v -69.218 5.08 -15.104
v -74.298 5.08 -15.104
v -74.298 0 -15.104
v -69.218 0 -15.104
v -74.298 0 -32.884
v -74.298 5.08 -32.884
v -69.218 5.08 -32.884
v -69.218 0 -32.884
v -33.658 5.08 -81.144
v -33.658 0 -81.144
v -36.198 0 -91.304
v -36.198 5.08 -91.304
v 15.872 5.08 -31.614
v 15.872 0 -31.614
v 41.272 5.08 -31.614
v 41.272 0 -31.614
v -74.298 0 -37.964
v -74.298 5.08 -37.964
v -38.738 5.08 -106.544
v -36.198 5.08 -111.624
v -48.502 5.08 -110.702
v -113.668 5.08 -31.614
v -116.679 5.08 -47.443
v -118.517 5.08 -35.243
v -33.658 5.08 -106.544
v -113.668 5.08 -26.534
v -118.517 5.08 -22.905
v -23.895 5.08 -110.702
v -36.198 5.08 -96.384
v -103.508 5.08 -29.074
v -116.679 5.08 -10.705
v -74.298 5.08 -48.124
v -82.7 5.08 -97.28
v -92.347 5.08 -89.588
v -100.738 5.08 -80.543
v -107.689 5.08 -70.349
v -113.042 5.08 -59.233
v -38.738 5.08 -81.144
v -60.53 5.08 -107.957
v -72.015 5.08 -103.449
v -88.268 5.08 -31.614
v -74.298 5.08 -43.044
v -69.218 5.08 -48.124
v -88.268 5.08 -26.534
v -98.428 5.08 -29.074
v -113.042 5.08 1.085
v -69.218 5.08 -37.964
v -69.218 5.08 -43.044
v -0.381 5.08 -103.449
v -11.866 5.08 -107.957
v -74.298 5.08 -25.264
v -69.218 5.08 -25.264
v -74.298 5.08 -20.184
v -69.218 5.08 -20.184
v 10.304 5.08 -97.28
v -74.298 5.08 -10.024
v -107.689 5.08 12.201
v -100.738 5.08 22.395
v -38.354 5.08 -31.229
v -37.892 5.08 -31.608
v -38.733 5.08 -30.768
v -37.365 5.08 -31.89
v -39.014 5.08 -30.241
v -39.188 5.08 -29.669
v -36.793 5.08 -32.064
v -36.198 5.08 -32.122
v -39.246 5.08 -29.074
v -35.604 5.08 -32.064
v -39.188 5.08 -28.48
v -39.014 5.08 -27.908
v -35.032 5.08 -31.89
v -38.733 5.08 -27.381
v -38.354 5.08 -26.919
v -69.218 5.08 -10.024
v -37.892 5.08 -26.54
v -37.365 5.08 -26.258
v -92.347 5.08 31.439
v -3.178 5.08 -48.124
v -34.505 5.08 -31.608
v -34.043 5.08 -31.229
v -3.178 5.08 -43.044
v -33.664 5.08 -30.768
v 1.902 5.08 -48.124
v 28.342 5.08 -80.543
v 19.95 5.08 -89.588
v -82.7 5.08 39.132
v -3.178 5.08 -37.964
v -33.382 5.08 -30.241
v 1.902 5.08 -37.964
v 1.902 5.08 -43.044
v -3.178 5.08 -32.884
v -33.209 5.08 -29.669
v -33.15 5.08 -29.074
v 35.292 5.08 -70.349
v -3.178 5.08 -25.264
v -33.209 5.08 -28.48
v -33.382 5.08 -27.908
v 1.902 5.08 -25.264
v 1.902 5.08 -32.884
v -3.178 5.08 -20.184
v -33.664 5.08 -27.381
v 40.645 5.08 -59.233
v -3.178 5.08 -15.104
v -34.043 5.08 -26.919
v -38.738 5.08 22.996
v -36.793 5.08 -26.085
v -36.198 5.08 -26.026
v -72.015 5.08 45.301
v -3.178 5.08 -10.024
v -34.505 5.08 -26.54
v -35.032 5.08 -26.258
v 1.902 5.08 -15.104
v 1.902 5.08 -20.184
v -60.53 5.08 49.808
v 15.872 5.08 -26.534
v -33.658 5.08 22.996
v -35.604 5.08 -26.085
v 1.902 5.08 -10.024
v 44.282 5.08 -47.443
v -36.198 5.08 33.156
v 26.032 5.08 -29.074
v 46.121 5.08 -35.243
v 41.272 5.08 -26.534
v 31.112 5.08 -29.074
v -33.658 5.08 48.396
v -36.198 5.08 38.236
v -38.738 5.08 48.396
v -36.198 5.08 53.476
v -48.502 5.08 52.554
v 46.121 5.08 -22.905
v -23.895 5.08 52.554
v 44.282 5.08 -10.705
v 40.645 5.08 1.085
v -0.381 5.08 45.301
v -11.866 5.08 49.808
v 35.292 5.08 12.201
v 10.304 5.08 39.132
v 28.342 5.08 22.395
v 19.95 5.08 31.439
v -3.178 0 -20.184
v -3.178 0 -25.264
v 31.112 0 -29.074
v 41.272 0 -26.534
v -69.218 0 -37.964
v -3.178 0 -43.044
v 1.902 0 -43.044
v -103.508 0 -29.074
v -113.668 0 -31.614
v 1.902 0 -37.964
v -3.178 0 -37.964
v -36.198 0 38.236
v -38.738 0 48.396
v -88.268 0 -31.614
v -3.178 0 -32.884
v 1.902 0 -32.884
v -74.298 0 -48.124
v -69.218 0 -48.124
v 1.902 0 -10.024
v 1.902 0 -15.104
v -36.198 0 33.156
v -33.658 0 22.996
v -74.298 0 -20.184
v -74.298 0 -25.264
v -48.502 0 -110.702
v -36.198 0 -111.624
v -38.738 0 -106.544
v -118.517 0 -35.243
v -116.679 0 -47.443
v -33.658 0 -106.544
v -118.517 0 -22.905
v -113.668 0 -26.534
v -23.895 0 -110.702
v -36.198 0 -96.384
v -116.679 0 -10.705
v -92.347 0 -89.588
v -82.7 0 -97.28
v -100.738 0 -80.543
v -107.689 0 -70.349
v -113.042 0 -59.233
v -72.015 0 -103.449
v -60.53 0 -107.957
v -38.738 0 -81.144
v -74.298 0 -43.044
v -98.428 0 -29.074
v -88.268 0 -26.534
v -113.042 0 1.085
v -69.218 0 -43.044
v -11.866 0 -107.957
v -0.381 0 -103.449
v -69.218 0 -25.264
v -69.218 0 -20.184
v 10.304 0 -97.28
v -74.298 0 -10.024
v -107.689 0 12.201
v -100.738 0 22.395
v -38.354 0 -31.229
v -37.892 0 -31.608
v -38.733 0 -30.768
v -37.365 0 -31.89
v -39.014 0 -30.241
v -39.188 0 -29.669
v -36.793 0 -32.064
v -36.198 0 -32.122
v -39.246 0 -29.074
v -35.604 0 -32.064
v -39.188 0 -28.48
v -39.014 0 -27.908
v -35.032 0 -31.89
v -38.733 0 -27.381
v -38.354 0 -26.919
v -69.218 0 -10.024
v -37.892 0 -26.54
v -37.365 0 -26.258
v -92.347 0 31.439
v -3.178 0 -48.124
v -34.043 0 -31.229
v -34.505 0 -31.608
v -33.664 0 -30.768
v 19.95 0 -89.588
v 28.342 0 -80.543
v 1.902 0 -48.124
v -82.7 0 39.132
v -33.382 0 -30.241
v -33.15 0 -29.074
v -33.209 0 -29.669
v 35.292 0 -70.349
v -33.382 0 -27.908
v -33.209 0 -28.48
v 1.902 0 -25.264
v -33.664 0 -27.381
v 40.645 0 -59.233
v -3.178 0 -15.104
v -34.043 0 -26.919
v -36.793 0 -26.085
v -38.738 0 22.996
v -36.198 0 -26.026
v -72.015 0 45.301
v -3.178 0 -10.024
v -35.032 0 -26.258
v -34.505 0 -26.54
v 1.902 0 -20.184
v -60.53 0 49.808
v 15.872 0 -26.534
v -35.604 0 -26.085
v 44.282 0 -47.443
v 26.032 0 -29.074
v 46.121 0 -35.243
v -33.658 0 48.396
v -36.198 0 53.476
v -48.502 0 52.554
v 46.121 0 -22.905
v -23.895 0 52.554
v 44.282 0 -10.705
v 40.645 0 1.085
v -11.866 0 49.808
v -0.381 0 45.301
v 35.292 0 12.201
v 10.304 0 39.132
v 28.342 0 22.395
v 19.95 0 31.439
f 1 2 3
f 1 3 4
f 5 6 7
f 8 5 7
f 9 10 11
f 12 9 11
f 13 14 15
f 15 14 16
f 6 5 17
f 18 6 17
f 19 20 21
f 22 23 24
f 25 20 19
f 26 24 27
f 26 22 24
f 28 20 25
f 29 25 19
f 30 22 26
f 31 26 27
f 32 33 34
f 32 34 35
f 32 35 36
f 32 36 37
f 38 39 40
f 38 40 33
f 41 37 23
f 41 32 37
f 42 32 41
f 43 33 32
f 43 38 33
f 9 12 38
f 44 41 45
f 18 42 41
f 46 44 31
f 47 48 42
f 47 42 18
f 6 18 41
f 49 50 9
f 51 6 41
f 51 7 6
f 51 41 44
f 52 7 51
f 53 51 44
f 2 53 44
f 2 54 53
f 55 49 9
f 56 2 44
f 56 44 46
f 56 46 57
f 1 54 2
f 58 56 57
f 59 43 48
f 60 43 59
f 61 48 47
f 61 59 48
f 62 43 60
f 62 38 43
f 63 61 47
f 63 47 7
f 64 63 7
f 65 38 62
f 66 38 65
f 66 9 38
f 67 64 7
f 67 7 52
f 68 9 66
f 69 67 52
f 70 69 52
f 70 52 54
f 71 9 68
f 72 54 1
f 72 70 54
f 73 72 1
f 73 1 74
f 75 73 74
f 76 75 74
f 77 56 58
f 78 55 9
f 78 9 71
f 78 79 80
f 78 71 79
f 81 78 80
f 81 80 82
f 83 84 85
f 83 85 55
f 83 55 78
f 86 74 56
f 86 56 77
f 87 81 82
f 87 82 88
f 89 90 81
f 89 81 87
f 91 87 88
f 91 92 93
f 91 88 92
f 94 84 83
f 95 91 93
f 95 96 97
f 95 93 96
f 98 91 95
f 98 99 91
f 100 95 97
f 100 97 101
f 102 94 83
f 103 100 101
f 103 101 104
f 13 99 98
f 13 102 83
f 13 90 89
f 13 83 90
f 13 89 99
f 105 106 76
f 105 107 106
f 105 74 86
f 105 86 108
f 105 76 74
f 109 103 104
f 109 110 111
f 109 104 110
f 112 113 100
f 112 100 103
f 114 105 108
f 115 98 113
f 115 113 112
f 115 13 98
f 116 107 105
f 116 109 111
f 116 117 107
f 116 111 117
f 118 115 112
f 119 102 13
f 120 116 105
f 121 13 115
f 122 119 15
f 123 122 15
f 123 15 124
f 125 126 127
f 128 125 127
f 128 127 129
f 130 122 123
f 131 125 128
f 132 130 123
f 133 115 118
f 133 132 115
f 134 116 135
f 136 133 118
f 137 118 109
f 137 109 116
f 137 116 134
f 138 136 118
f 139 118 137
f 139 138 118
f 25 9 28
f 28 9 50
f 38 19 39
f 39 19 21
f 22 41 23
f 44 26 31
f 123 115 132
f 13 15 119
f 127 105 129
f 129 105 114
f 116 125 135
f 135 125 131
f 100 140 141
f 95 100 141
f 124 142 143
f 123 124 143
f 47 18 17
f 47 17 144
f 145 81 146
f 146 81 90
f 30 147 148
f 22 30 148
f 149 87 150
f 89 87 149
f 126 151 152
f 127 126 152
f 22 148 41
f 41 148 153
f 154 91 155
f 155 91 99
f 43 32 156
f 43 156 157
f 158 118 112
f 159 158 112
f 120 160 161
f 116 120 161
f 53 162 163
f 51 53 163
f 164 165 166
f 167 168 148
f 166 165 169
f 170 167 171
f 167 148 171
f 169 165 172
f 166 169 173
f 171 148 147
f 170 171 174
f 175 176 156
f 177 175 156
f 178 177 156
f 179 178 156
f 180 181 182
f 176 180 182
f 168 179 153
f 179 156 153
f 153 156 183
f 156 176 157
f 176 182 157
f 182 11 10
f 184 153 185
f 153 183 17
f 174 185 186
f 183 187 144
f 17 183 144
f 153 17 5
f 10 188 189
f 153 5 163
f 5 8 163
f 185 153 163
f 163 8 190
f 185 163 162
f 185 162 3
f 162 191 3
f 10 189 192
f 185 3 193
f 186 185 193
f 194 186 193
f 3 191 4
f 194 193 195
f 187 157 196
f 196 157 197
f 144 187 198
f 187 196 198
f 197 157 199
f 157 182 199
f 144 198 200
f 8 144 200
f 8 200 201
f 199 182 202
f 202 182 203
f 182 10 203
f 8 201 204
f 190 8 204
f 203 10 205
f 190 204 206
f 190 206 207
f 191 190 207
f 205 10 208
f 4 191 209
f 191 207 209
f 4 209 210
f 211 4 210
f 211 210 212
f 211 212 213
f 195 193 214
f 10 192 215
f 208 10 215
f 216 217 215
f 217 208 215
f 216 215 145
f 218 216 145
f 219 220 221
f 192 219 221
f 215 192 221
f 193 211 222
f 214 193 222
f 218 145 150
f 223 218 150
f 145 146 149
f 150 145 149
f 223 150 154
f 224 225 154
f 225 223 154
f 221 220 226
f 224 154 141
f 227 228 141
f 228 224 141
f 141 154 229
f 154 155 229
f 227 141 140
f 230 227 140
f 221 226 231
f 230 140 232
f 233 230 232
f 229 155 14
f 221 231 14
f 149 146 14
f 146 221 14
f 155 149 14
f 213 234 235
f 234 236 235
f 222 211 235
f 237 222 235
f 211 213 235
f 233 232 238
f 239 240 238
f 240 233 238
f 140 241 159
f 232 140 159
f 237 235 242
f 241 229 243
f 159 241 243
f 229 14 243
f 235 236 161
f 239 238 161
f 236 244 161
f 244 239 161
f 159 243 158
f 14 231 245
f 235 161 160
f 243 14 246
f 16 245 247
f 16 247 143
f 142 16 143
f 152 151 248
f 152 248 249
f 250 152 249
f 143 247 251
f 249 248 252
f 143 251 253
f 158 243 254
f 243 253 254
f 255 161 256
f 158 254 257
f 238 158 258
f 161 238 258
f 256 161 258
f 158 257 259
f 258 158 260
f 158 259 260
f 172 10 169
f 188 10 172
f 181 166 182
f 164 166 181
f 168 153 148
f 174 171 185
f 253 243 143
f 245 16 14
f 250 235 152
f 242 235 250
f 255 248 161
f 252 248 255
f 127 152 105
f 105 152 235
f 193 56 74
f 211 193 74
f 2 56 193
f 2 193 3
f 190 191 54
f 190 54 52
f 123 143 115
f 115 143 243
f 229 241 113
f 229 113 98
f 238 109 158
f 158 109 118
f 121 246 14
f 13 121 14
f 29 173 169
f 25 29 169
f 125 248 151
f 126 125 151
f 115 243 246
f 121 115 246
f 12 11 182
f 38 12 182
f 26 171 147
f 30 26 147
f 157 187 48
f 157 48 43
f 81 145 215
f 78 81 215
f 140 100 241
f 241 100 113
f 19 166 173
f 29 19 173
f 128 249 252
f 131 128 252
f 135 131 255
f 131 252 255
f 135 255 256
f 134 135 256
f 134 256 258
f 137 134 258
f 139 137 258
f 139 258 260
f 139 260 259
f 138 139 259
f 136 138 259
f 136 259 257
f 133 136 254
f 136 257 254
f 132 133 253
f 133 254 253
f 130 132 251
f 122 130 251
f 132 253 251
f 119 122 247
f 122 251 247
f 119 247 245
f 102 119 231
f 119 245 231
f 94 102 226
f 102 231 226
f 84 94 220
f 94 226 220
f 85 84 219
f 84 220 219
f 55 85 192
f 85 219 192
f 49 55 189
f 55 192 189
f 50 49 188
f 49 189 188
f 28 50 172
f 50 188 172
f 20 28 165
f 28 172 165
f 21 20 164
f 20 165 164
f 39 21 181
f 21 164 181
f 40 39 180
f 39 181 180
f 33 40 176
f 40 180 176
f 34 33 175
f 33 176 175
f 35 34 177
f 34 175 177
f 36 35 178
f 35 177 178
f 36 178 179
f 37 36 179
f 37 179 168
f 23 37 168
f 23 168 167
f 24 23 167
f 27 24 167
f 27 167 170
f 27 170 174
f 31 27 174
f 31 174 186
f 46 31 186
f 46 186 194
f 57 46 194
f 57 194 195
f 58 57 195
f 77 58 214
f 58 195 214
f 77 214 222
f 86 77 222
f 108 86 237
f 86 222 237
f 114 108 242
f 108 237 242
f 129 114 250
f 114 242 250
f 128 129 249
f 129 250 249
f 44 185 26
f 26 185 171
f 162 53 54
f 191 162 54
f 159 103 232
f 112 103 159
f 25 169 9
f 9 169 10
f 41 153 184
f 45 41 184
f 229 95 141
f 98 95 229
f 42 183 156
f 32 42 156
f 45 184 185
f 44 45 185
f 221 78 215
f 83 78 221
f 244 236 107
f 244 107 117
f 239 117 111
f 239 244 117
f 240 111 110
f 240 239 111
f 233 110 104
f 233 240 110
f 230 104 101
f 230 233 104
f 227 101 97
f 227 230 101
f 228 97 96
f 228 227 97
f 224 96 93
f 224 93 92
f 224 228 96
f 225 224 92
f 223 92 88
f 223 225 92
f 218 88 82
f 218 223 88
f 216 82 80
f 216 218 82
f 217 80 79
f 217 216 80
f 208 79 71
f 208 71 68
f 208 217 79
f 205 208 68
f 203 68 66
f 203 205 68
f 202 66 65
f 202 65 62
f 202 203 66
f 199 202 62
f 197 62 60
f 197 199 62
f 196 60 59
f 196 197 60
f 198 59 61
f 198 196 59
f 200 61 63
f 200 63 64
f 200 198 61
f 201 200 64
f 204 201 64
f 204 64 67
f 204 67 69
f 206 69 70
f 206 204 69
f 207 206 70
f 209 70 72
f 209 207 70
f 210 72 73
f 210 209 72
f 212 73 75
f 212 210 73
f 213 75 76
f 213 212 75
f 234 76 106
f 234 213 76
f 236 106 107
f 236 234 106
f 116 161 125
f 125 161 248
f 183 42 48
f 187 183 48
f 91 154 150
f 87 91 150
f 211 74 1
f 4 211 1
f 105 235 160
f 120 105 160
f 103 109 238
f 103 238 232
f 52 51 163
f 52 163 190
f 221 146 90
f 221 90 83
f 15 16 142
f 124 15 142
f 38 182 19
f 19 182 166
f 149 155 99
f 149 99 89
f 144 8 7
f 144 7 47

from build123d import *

# Parameters (mm, degrees)
SKETCH1_R           = 82.55
SKETCH1_R_2         = 3.048
BOSS_EXTRUDE1_DEPTH = 5.08
SKETCH2_W           = 5.08
SKETCH2_H           = 5.08
CUT_EXTRUDE1_DEPTH  = 5.08


with BuildPart() as part:
    # Sketch1 → Boss-Extrude1 (new body)
    with BuildSketch(Plane(origin=(0, 0, 0), x_dir=(1, 0, 0), z_dir=(0, 1, 0))):
        with Locations(Location((-36.198285131, 29.074154547, 0), (0, 0, 270))):
            Circle(SKETCH1_R)
        with Locations(Location((-36.198285131, 29.074154547, 0), (0, 0, 270))):
            Circle(SKETCH1_R_2, mode=Mode.SUBTRACT)
        Polygon((-36.198285131, 96.384154547), (-33.658285131, 106.544154547), (-33.658285131, 81.144154547), (-36.198285131, 91.304154547), (-38.738285131, 81.144154547), (-38.738285131, 106.544154547), align=None, mode=Mode.SUBTRACT)
        Polygon((31.111714869, 29.074154547), (41.271714869, 26.534154547), (15.871714869, 26.534154547), (26.031714869, 29.074154547), (15.871714869, 31.614154547), (41.271714869, 31.614154547), align=None, mode=Mode.SUBTRACT)
        Polygon((-36.198285131, -38.235845453), (-38.738285131, -48.395845453), (-38.738285131, -22.995845453), (-36.198285131, -33.155845453), (-33.658285131, -22.995845453), (-33.658285131, -48.395845453), align=None, mode=Mode.SUBTRACT)
        Polygon((-103.508285131, 29.074154547), (-113.668285131, 31.614154547), (-88.268285131, 31.614154547), (-98.428285131, 29.074154547), (-88.268285131, 26.534154547), (-113.668285131, 26.534154547), align=None, mode=Mode.SUBTRACT)
    extrude(amount=BOSS_EXTRUDE1_DEPTH)

    # Sketch2 → Cut-Extrude1 (cut)
    with BuildSketch(Plane(origin=(0, 5.08, 0), x_dir=(1, 0, 0), z_dir=(0, 1, 0))):
        with Locations((-0.638285131, 22.724154547)):
            Rectangle(SKETCH2_W, SKETCH2_H)
        with Locations((-0.638285131, 45.584154547)):
            Rectangle(SKETCH2_W, SKETCH2_H)
        with Locations((-0.638285131, 35.424154547)):
            Rectangle(SKETCH2_W, SKETCH2_H)
        with Locations((-0.638285131, 12.564154547)):
            Rectangle(SKETCH2_W, SKETCH2_H)
        with Locations((-71.758285131, 12.564154547)):
            Rectangle(SKETCH2_W, SKETCH2_H)
        with Locations((-71.758285131, 22.724154547)):
            Rectangle(SKETCH2_W, SKETCH2_H)
        with Locations((-71.758285131, 35.424154547)):
            Rectangle(SKETCH2_W, SKETCH2_H)
        with Locations((-71.758285131, 45.584154547)):
            Rectangle(SKETCH2_W, SKETCH2_H)
    extrude(amount=-CUT_EXTRUDE1_DEPTH, mode=Mode.SUBTRACT)


solid = part.part
